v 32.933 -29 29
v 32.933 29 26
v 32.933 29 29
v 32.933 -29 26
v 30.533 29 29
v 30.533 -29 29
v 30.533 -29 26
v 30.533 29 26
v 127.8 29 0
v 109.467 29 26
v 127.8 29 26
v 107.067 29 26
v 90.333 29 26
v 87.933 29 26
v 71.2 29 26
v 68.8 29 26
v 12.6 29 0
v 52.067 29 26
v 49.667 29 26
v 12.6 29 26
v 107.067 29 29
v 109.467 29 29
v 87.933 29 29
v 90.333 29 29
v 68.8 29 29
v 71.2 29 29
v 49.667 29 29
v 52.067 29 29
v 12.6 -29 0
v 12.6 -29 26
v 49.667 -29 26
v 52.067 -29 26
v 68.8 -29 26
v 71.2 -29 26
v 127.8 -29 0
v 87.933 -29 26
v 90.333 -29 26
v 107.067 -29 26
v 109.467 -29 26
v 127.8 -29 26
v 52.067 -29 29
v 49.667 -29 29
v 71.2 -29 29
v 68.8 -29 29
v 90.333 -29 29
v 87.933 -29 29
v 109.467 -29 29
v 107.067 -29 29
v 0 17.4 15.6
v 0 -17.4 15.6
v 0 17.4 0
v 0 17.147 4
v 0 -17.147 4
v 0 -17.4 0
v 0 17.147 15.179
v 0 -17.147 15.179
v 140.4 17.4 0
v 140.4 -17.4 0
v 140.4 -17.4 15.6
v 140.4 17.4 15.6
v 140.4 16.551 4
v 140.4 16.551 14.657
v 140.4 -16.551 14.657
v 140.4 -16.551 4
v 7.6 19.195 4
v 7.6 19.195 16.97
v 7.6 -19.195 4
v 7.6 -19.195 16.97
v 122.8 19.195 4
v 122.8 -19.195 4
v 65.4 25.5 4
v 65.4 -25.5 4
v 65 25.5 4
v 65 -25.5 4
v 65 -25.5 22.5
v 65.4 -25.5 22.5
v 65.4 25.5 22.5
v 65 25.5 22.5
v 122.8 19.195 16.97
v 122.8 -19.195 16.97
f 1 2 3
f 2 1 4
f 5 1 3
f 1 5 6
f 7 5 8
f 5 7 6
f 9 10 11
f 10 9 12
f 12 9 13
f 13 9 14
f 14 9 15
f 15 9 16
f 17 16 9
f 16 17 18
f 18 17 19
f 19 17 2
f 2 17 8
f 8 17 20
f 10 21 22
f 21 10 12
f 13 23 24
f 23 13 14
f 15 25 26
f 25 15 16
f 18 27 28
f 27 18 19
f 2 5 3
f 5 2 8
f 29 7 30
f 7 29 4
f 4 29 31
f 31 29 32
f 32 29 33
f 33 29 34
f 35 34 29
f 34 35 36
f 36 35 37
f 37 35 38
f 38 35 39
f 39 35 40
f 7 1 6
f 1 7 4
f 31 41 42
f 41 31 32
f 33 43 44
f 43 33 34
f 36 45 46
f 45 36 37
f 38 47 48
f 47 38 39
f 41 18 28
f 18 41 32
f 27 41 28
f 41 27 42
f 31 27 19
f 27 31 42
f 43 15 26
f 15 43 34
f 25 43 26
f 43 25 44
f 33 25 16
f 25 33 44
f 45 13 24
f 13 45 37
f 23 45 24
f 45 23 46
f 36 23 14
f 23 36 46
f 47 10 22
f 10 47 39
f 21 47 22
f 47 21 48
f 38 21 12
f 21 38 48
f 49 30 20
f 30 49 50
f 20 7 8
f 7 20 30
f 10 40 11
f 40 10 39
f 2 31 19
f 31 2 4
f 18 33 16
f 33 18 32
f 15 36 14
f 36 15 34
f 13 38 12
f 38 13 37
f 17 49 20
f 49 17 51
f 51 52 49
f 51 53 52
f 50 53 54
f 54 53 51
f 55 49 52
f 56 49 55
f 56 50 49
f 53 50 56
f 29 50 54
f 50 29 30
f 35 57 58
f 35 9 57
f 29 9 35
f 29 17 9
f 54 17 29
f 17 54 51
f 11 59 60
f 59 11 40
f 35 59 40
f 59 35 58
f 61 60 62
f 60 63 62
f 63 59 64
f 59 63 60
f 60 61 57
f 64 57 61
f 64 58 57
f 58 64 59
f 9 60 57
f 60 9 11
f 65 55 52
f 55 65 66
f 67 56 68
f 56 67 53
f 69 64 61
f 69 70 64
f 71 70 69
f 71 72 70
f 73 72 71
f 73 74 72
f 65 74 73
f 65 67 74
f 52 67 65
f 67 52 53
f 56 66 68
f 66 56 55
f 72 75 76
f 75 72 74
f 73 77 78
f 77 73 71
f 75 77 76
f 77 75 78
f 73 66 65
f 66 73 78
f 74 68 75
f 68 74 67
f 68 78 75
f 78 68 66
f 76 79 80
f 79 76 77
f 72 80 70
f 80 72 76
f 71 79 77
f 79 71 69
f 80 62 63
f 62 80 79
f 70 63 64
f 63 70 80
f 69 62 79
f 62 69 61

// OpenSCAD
$fn = 32;

// ----------------------------------------------------------------------
// Faired channel: 140 x 58 x 26 mm, 3.5 mm walls, faired ends
// ----------------------------------------------------------------------

// --- parameters (mm) ---
length = 140;             // channel length
width = 58;               // channel width at mid length
height = 26;              // channel height at mid length
wall = 3.5;               // side wall thickness
floor_t = 4;              // floor thickness
end_w = 34.8;             // faired end width
end_h = 15.6;             // faired end height
ribs = 5;                 // stiffening ribs on the top
rib_t = 2.4;              // rib thickness
rib_h = 3;                // rib height

difference() {
  union() {
    hull() {
      translate([0, -17.4, 0]) cube([0.4, 34.8, 15.6]);
      translate([12.6, -29, 0]) cube([0.4, 58, 26]);
    }
    hull() {
      translate([12.6, -29, 0]) cube([0.4, 58, 26]);
      translate([70, -29, 0]) cube([0.4, 58, 26]);
    }
    hull() {
      translate([70, -29, 0]) cube([0.4, 58, 26]);
      translate([127.4, -29, 0]) cube([0.4, 58, 26]);
    }
    hull() {
      translate([127.4, -29, 0]) cube([0.4, 58, 26]);
      translate([140, -17.4, 0]) cube([0.4, 34.8, 15.6]);
    }
    /* stiffening ribs across the flat top, sunk 0.8 mm into it */
    for (i = [1 : ribs]) {
      translate([12.6 + i * (length - 2 * 12.6) / (ribs + 1) - rib_t / 2, -width / 2, height - 0.8]) cube([rib_t, width, rib_h + 0.8]);
    }
  }
  /* cavity, 5 mm proud of both ends so the ports are cut clean */
  hull() {
    translate([-5, -15.8, 4]) cube([0.4, 31.6, 10]);
    translate([7.6, -19.195, 4]) cube([0.4, 38.39, 12.97]);
  }
  hull() {
    translate([7.6, -19.195, 4]) cube([0.4, 38.39, 12.97]);
    translate([65, -25.5, 4]) cube([0.4, 51, 18.5]);
  }
  hull() {
    translate([65, -25.5, 4]) cube([0.4, 51, 18.5]);
    translate([122.4, -19.195, 4]) cube([0.4, 38.39, 12.97]);
  }
  hull() {
    translate([122.4, -19.195, 4]) cube([0.4, 38.39, 12.97]);
    translate([145, -15.8, 4]) cube([0.4, 31.6, 10]);
  }
}
